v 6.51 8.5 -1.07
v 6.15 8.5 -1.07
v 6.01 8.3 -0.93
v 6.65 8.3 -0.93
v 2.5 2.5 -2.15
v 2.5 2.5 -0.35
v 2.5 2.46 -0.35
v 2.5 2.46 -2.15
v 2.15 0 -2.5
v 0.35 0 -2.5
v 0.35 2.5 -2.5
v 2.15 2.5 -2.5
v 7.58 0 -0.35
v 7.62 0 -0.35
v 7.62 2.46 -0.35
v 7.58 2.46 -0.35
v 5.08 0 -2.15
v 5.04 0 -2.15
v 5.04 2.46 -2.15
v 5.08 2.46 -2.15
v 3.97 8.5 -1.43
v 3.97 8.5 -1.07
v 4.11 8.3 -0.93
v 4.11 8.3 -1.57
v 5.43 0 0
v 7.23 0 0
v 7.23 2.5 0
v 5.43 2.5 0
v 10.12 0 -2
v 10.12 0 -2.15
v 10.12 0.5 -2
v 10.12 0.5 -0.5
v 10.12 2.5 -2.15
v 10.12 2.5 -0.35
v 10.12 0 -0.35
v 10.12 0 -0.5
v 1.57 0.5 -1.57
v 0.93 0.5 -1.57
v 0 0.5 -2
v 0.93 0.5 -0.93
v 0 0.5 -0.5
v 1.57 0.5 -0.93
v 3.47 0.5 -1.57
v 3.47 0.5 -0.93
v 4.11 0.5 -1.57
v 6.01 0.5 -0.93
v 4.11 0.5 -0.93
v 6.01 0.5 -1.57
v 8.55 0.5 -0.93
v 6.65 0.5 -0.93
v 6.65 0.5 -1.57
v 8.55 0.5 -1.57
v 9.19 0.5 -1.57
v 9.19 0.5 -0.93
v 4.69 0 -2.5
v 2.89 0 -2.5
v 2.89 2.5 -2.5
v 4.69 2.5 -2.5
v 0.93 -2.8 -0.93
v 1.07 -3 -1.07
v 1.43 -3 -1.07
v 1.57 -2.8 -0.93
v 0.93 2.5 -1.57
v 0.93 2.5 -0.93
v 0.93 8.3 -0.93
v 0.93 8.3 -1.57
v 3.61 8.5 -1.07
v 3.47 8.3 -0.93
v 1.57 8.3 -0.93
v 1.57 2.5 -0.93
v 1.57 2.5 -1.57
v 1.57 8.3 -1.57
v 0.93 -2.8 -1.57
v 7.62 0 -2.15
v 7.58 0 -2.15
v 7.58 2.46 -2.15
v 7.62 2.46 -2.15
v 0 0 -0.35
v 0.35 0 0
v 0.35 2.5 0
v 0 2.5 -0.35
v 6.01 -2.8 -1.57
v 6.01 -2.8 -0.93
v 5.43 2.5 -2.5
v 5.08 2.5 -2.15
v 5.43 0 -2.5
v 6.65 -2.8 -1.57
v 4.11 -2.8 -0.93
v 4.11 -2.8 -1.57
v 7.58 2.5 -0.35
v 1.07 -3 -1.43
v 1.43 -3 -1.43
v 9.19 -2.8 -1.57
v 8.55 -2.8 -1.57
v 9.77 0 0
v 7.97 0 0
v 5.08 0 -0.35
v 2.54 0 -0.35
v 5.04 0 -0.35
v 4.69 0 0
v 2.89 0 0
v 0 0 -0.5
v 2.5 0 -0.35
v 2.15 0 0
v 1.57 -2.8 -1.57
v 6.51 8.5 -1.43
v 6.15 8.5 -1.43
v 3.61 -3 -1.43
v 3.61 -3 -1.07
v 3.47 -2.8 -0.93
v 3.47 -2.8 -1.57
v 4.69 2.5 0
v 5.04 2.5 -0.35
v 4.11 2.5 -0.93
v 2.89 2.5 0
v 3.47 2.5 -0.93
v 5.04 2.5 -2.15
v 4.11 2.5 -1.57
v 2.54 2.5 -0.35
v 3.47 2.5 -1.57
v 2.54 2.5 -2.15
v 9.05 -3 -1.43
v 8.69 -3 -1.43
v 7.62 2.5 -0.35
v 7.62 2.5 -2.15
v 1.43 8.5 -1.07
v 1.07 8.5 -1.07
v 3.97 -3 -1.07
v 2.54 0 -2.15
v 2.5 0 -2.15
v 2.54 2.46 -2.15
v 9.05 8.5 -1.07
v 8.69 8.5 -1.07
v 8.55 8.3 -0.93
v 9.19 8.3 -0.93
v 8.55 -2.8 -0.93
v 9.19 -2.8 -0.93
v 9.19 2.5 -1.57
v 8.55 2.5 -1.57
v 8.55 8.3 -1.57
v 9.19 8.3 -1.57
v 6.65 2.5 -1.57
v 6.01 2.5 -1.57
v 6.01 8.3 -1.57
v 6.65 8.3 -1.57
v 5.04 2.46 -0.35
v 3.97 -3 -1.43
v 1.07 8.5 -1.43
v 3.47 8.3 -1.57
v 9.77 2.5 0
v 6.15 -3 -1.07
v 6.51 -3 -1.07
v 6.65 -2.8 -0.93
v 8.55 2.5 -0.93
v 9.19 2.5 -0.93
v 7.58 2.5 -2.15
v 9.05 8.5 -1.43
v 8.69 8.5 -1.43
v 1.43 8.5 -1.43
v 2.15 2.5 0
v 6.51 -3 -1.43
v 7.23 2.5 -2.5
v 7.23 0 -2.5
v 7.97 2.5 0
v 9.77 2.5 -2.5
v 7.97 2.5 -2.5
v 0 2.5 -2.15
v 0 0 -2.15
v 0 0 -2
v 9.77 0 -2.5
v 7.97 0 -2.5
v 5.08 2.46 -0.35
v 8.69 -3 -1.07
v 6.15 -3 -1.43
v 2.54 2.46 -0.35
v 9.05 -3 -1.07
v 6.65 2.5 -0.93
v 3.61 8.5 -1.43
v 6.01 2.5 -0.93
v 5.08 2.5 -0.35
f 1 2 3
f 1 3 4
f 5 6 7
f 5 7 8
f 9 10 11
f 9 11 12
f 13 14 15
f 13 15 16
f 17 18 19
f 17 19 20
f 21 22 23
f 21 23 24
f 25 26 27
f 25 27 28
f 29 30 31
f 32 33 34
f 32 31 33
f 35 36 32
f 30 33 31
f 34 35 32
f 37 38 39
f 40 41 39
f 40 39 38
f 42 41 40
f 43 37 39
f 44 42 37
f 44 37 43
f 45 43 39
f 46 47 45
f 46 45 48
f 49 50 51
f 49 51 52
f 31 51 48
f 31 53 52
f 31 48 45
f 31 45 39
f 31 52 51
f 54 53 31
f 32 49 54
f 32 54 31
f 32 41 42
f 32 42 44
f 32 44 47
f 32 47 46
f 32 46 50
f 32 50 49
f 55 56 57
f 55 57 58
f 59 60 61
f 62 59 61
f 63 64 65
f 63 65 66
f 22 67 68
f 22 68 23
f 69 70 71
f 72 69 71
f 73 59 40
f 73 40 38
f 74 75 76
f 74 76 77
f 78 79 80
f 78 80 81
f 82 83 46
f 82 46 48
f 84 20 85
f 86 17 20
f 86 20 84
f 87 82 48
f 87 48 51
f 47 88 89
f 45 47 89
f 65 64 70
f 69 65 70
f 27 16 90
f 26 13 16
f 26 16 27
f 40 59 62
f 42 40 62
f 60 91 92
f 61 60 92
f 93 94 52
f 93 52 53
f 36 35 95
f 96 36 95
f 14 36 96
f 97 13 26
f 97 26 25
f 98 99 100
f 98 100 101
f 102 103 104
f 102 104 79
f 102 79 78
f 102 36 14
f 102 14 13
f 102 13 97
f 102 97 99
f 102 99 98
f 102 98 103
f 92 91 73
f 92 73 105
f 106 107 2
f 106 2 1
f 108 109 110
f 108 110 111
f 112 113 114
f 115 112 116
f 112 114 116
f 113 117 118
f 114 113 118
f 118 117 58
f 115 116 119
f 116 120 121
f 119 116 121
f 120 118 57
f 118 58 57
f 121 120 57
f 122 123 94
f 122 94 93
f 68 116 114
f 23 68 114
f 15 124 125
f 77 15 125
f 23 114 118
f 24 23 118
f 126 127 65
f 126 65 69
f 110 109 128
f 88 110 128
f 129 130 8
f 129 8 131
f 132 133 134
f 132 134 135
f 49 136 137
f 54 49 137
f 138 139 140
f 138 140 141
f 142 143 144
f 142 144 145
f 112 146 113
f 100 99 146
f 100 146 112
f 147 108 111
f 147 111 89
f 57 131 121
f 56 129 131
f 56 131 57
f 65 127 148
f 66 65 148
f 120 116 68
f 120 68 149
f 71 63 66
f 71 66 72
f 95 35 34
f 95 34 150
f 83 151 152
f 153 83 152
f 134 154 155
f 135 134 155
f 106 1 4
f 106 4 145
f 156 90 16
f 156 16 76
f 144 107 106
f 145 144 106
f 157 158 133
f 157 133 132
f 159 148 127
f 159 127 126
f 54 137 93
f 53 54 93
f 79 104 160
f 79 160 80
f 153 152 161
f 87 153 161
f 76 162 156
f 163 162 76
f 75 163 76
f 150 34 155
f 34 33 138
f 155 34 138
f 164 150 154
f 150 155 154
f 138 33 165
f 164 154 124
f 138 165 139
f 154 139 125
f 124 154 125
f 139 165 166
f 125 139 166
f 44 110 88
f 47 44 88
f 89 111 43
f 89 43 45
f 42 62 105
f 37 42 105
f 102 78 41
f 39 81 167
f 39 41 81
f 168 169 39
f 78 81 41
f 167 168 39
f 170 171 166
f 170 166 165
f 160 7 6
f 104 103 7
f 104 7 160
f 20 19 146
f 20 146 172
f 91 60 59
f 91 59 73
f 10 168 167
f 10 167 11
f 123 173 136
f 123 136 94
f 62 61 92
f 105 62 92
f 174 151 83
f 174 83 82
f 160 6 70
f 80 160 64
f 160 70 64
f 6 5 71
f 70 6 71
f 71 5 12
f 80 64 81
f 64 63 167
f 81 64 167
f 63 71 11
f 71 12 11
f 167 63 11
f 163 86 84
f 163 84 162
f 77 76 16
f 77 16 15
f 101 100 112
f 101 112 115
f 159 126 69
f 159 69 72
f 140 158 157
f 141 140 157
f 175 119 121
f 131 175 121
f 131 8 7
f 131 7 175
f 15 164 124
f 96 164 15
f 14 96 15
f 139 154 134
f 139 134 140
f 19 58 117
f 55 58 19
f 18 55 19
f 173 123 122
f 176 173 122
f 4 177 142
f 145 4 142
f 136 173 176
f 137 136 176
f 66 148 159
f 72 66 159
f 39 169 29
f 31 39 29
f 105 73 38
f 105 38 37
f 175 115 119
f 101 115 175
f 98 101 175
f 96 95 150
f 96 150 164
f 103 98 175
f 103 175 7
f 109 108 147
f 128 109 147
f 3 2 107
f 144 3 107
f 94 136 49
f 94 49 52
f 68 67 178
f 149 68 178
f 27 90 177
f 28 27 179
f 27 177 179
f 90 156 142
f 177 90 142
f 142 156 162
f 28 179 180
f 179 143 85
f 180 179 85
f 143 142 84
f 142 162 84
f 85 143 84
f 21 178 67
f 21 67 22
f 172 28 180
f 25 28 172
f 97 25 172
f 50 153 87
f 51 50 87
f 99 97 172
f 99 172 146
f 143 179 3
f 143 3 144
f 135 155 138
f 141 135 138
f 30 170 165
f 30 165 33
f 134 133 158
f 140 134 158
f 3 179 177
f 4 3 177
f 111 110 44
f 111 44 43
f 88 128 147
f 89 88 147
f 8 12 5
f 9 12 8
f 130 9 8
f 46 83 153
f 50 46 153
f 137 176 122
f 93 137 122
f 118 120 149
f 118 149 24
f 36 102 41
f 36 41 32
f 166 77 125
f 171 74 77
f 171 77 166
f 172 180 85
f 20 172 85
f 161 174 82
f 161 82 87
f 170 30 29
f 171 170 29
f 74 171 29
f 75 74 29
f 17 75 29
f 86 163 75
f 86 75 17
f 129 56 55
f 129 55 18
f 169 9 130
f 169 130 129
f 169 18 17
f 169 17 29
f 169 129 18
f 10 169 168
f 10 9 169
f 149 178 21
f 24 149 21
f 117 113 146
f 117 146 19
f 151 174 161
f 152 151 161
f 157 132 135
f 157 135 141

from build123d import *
from OCP.BRepFilletAPI import BRepFilletAPI_MakeChamfer

# Parameters (mm, degrees)
BOSS_EXTRUDE1_DEPTH         = 2.5
SKETCH2_W                   = 10.12
SKETCH2_H                   = 1.5
CUT_EXTRUDE1_DEPTH          = 0.5
SKETCH4_W                   = 0.04
SKETCH4_H                   = 1.8
CUT_EXTRUDE2_DEPTH          = 0.04
BOSS_EXTRUDE2_START         = -5.5
SKETCH3_W                   = 0.64
SKETCH3_H                   = 0.64
BOSS_EXTRUDE2_DEPTH         = 11.5
CHAMFER1_SIZE               = 0.2
CHAMFER1_SIZE2              = 0.140041508
LPATTERN1_COUNT             = 4
LPATTERN1_PITCH             = 2.54
CHAMFER1_OF_LPATTERN1_SIZE  = 0.2
CHAMFER1_OF_LPATTERN1_SIZE2 = 0.140041508


with BuildPart() as part:
    # Sketch1 → Boss-Extrude1 (new body)
    with BuildSketch(Plane(origin=(0, 0, 0), x_dir=(1, 0, 0), z_dir=(0, 1, 0))):
        Polygon((0, 2.15), (0.35, 2.5), (2.15, 2.5), (2.5, 2.15), (2.54, 2.15), (2.89, 2.5), (4.69, 2.5), (5.04, 2.15), (5.08, 2.15), (5.43, 2.5), (7.23, 2.5), (7.58, 2.15), (7.62, 2.15), (7.97, 2.5), (9.77, 2.5), (10.12, 2.15), (10.12, 0.35), (9.77, 0), (7.97, 0), (7.62, 0.35), (7.58, 0.35), (7.23, 0), (5.43, 0), (5.08, 0.35), (5.04, 0.35), (4.69, 0), (2.89, 0), (2.54, 0.35), (2.5, 0.35), (2.15, 0), (0.35, 0), (0, 0.35), align=None)
    extrude(amount=BOSS_EXTRUDE1_DEPTH)

    # Sketch2 → Cut-Extrude1 (cut)
    with BuildSketch(Plane.XZ):
        with Locations((5.06, -1.25)):
            Rectangle(SKETCH2_W, SKETCH2_H)
    extrude(amount=-CUT_EXTRUDE1_DEPTH, mode=Mode.SUBTRACT)

    # Sketch4 → Cut-Extrude2 (cut)
    with BuildSketch(Plane(origin=(0, 2.5, 0), x_dir=(1, 0, 0), z_dir=(0, 1, 0))):
        with Locations((5.06, 1.25)):
            Rectangle(SKETCH4_W, SKETCH4_H)
        with Locations((2.52, 1.25)):
            Rectangle(SKETCH4_W, SKETCH4_H)
        with Locations((7.6, 1.25)):
            Rectangle(SKETCH4_W, SKETCH4_H)
        with Locations((10.14, 1.25)):
            Rectangle(SKETCH4_W, SKETCH4_H)
        with Locations((12.68, 1.25)):
            Rectangle(SKETCH4_W, SKETCH4_H)
        with Locations((15.22, 1.25)):
            Rectangle(SKETCH4_W, SKETCH4_H)
        with Locations((17.76, 1.25)):
            Rectangle(SKETCH4_W, SKETCH4_H)
    extrude(amount=-CUT_EXTRUDE2_DEPTH, mode=Mode.SUBTRACT)

    # Sketch3 → Boss-Extrude2 (add)
    with BuildSketch(Plane(origin=(0, 2.5, 0), x_dir=(1, 0, 0), z_dir=(0, 1, 0)).offset(BOSS_EXTRUDE2_START)):
        with Locations((1.25, 1.25)):
            Rectangle(SKETCH3_W, SKETCH3_H)
    boss_extrude2 = extrude(amount=BOSS_EXTRUDE2_DEPTH)

    # Chamfer1: one chamfer whose edges measure the first distance from different faces: ONE call of the kernel's chamfer builder (chamfer() names one face for all edges)
    chamfer1_edges_1 = [part.edges().sort_by_distance(p)[0] for p in [
        (1.57, -3, -1.25),
    ]]
    chamfer1_side_1 = [part.faces().sort_by_distance(p)[0] for p in [
        (1.57, -1.25, -1.25),
    ]]
    chamfer1_edges_2 = [part.edges().sort_by_distance(p)[0] for p in [
        (1.25, -3, -0.93),
    ]]
    chamfer1_side_2 = [part.faces().sort_by_distance(p)[0] for p in [
        (1.25, -1.25, -0.93),
    ]]
    chamfer1_edges_3 = [part.edges().sort_by_distance(p)[0] for p in [
        (0.93, -3, -1.25),
    ]]
    chamfer1_side_3 = [part.faces().sort_by_distance(p)[0] for p in [
        (0.93, -1.25, -1.25),
    ]]
    chamfer1_edges_4 = [part.edges().sort_by_distance(p)[0] for p in [
        (1.25, -3, -1.57),
    ]]
    chamfer1_side_4 = [part.faces().sort_by_distance(p)[0] for p in [
        (1.25, -1.25, -1.57),
    ]]
    chamfer1_edges_5 = [part.edges().sort_by_distance(p)[0] for p in [
        (1.57, 8.5, -1.25),
    ]]
    chamfer1_side_5 = [part.faces().sort_by_distance(p)[0] for p in [
        (1.57, 5.5, -1.25),
    ]]
    chamfer1_edges_6 = [part.edges().sort_by_distance(p)[0] for p in [
        (1.25, 8.5, -1.57),
    ]]
    chamfer1_side_6 = [part.faces().sort_by_distance(p)[0] for p in [
        (1.25, 5.5, -1.57),
    ]]
    chamfer1_edges_7 = [part.edges().sort_by_distance(p)[0] for p in [
        (0.93, 8.5, -1.25),
    ]]
    chamfer1_side_7 = [part.faces().sort_by_distance(p)[0] for p in [
        (0.93, 5.5, -1.25),
    ]]
    chamfer1_edges_8 = [part.edges().sort_by_distance(p)[0] for p in [
        (1.25, 8.5, -0.93),
    ]]
    chamfer1_side_8 = [part.faces().sort_by_distance(p)[0] for p in [
        (1.25, 5.5, -0.93),
    ]]
    chamfer1 = BRepFilletAPI_MakeChamfer(part.part.solid().wrapped)
    for e in chamfer1_edges_1:
        chamfer1.Add(CHAMFER1_SIZE, CHAMFER1_SIZE2, e.wrapped, chamfer1_side_1[0].wrapped)  # the first distance lies on this face
    for e in chamfer1_edges_2:
        chamfer1.Add(CHAMFER1_SIZE, CHAMFER1_SIZE2, e.wrapped, chamfer1_side_2[0].wrapped)  # the first distance lies on this face
    for e in chamfer1_edges_3:
        chamfer1.Add(CHAMFER1_SIZE, CHAMFER1_SIZE2, e.wrapped, chamfer1_side_3[0].wrapped)  # the first distance lies on this face
    for e in chamfer1_edges_4:
        chamfer1.Add(CHAMFER1_SIZE, CHAMFER1_SIZE2, e.wrapped, chamfer1_side_4[0].wrapped)  # the first distance lies on this face
    for e in chamfer1_edges_5:
        chamfer1.Add(CHAMFER1_SIZE, CHAMFER1_SIZE2, e.wrapped, chamfer1_side_5[0].wrapped)  # the first distance lies on this face
    for e in chamfer1_edges_6:
        chamfer1.Add(CHAMFER1_SIZE, CHAMFER1_SIZE2, e.wrapped, chamfer1_side_6[0].wrapped)  # the first distance lies on this face
    for e in chamfer1_edges_7:
        chamfer1.Add(CHAMFER1_SIZE, CHAMFER1_SIZE2, e.wrapped, chamfer1_side_7[0].wrapped)  # the first distance lies on this face
    for e in chamfer1_edges_8:
        chamfer1.Add(CHAMFER1_SIZE, CHAMFER1_SIZE2, e.wrapped, chamfer1_side_8[0].wrapped)  # the first distance lies on this face
    add(Compound.cast(chamfer1.Shape()), mode=Mode.REPLACE)

    # LPattern1: Boss-Extrude2 ×4
    with Locations(*[(i * LPATTERN1_PITCH, 0, 0) for i in range(1, LPATTERN1_COUNT)]):
        add(boss_extrude2)

    # Chamfer1 of LPattern1: one chamfer whose edges measure the first distance from different faces: ONE call of the kernel's chamfer builder (chamfer() names one face for all edges)
    chamfer1_of_lpattern1_edges_1 = [part.edges().sort_by_distance(p)[0] for p in [
        (4.11, -3, -1.25),
    ]]
    chamfer1_of_lpattern1_side_1 = [part.faces().sort_by_distance(p)[0] for p in [
        (4.11, -1.25, -1.25),
    ]]
    chamfer1_of_lpattern1_edges_2 = [part.edges().sort_by_distance(p)[0] for p in [
        (3.79, -3, -0.93),
    ]]
    chamfer1_of_lpattern1_side_2 = [part.faces().sort_by_distance(p)[0] for p in [
        (3.79, -1.25, -0.93),
    ]]
    chamfer1_of_lpattern1_edges_3 = [part.edges().sort_by_distance(p)[0] for p in [
        (3.47, -3, -1.25),
    ]]
    chamfer1_of_lpattern1_side_3 = [part.faces().sort_by_distance(p)[0] for p in [
        (3.47, -1.25, -1.25),
    ]]
    chamfer1_of_lpattern1_edges_4 = [part.edges().sort_by_distance(p)[0] for p in [
        (3.79, -3, -1.57),
    ]]
    chamfer1_of_lpattern1_side_4 = [part.faces().sort_by_distance(p)[0] for p in [
        (3.79, -1.25, -1.57),
    ]]
    chamfer1_of_lpattern1_edges_5 = [part.edges().sort_by_distance(p)[0] for p in [
        (4.11, 8.5, -1.25),
    ]]
    chamfer1_of_lpattern1_side_5 = [part.faces().sort_by_distance(p)[0] for p in [
        (4.11, 5.5, -1.25),
    ]]
    chamfer1_of_lpattern1_edges_6 = [part.edges().sort_by_distance(p)[0] for p in [
        (3.79, 8.5, -1.57),
    ]]
    chamfer1_of_lpattern1_side_6 = [part.faces().sort_by_distance(p)[0] for p in [
        (3.79, 5.5, -1.57),
    ]]
    chamfer1_of_lpattern1_edges_7 = [part.edges().sort_by_distance(p)[0] for p in [
        (3.47, 8.5, -1.25),
    ]]
    chamfer1_of_lpattern1_side_7 = [part.faces().sort_by_distance(p)[0] for p in [
        (3.47, 5.5, -1.25),
    ]]
    chamfer1_of_lpattern1_edges_8 = [part.edges().sort_by_distance(p)[0] for p in [
        (3.79, 8.5, -0.93),
    ]]
    chamfer1_of_lpattern1_side_8 = [part.faces().sort_by_distance(p)[0] for p in [
        (3.79, 5.5, -0.93),
    ]]
    chamfer1_of_lpattern1_edges_9 = [part.edges().sort_by_distance(p)[0] for p in [
        (6.65, -3, -1.25),
    ]]
    chamfer1_of_lpattern1_side_9 = [part.faces().sort_by_distance(p)[0] for p in [
        (6.65, -1.25, -1.25),
    ]]
    chamfer1_of_lpattern1_edges_10 = [part.edges().sort_by_distance(p)[0] for p in [
        (6.33, -3, -0.93),
    ]]
    chamfer1_of_lpattern1_side_10 = [part.faces().sort_by_distance(p)[0] for p in [
        (6.33, -1.25, -0.93),
    ]]
    chamfer1_of_lpattern1_edges_11 = [part.edges().sort_by_distance(p)[0] for p in [
        (6.01, -3, -1.25),
    ]]
    chamfer1_of_lpattern1_side_11 = [part.faces().sort_by_distance(p)[0] for p in [
        (6.01, -1.25, -1.25),
    ]]
    chamfer1_of_lpattern1_edges_12 = [part.edges().sort_by_distance(p)[0] for p in [
        (6.33, -3, -1.57),
    ]]
    chamfer1_of_lpattern1_side_12 = [part.faces().sort_by_distance(p)[0] for p in [
        (6.33, -1.25, -1.57),
    ]]
    chamfer1_of_lpattern1_edges_13 = [part.edges().sort_by_distance(p)[0] for p in [
        (6.65, 8.5, -1.25),
    ]]
    chamfer1_of_lpattern1_side_13 = [part.faces().sort_by_distance(p)[0] for p in [
        (6.65, 5.5, -1.25),
    ]]
    chamfer1_of_lpattern1_edges_14 = [part.edges().sort_by_distance(p)[0] for p in [
        (6.33, 8.5, -1.57),
    ]]
    chamfer1_of_lpattern1_side_14 = [part.faces().sort_by_distance(p)[0] for p in [
        (6.33, 5.5, -1.57),
    ]]
    chamfer1_of_lpattern1_edges_15 = [part.edges().sort_by_distance(p)[0] for p in [
        (6.01, 8.5, -1.25),
    ]]
    chamfer1_of_lpattern1_side_15 = [part.faces().sort_by_distance(p)[0] for p in [
        (6.01, 5.5, -1.25),
    ]]
    chamfer1_of_lpattern1_edges_16 = [part.edges().sort_by_distance(p)[0] for p in [
        (6.33, 8.5, -0.93),
    ]]
    chamfer1_of_lpattern1_side_16 = [part.faces().sort_by_distance(p)[0] for p in [
        (6.33, 5.5, -0.93),
    ]]
    chamfer1_of_lpattern1_edges_17 = [part.edges().sort_by_distance(p)[0] for p in [
        (9.19, -3, -1.25),
    ]]
    chamfer1_of_lpattern1_side_17 = [part.faces().sort_by_distance(p)[0] for p in [
        (9.19, -1.25, -1.25),
    ]]
    chamfer1_of_lpattern1_edges_18 = [part.edges().sort_by_distance(p)[0] for p in [
        (8.87, -3, -0.93),
    ]]
    chamfer1_of_lpattern1_side_18 = [part.faces().sort_by_distance(p)[0] for p in [
        (8.87, -1.25, -0.93),
    ]]
    chamfer1_of_lpattern1_edges_19 = [part.edges().sort_by_distance(p)[0] for p in [
        (8.55, -3, -1.25),
    ]]
    chamfer1_of_lpattern1_side_19 = [part.faces().sort_by_distance(p)[0] for p in [
        (8.55, -1.25, -1.25),
    ]]
    chamfer1_of_lpattern1_edges_20 = [part.edges().sort_by_distance(p)[0] for p in [
        (8.87, -3, -1.57),
    ]]
    chamfer1_of_lpattern1_side_20 = [part.faces().sort_by_distance(p)[0] for p in [
        (8.87, -1.25, -1.57),
    ]]
    chamfer1_of_lpattern1_edges_21 = [part.edges().sort_by_distance(p)[0] for p in [
        (9.19, 8.5, -1.25),
    ]]
    chamfer1_of_lpattern1_side_21 = [part.faces().sort_by_distance(p)[0] for p in [
        (9.19, 5.5, -1.25),
    ]]
    chamfer1_of_lpattern1_edges_22 = [part.edges().sort_by_distance(p)[0] for p in [
        (8.87, 8.5, -1.57),
    ]]
    chamfer1_of_lpattern1_side_22 = [part.faces().sort_by_distance(p)[0] for p in [
        (8.87, 5.5, -1.57),
    ]]
    chamfer1_of_lpattern1_edges_23 = [part.edges().sort_by_distance(p)[0] for p in [
        (8.55, 8.5, -1.25),
    ]]
    chamfer1_of_lpattern1_side_23 = [part.faces().sort_by_distance(p)[0] for p in [
        (8.55, 5.5, -1.25),
    ]]
    chamfer1_of_lpattern1_edges_24 = [part.edges().sort_by_distance(p)[0] for p in [
        (8.87, 8.5, -0.93),
    ]]
    chamfer1_of_lpattern1_side_24 = [part.faces().sort_by_distance(p)[0] for p in [
        (8.87, 5.5, -0.93),
    ]]
    chamfer1_of_lpattern1 = BRepFilletAPI_MakeChamfer(part.part.solid().wrapped)
    for e in chamfer1_of_lpattern1_edges_1:
        chamfer1_of_lpattern1.Add(CHAMFER1_OF_LPATTERN1_SIZE, CHAMFER1_OF_LPATTERN1_SIZE2, e.wrapped, chamfer1_of_lpattern1_side_1[0].wrapped)  # the first distance lies on this face
    for e in chamfer1_of_lpattern1_edges_2:
        chamfer1_of_lpattern1.Add(CHAMFER1_OF_LPATTERN1_SIZE, CHAMFER1_OF_LPATTERN1_SIZE2, e.wrapped, chamfer1_of_lpattern1_side_2[0].wrapped)  # the first distance lies on this face
    for e in chamfer1_of_lpattern1_edges_3:
        chamfer1_of_lpattern1.Add(CHAMFER1_OF_LPATTERN1_SIZE, CHAMFER1_OF_LPATTERN1_SIZE2, e.wrapped, chamfer1_of_lpattern1_side_3[0].wrapped)  # the first distance lies on this face
    for e in chamfer1_of_lpattern1_edges_4:
        chamfer1_of_lpattern1.Add(CHAMFER1_OF_LPATTERN1_SIZE, CHAMFER1_OF_LPATTERN1_SIZE2, e.wrapped, chamfer1_of_lpattern1_side_4[0].wrapped)  # the first distance lies on this face
    for e in chamfer1_of_lpattern1_edges_5:
        chamfer1_of_lpattern1.Add(CHAMFER1_OF_LPATTERN1_SIZE, CHAMFER1_OF_LPATTERN1_SIZE2, e.wrapped, chamfer1_of_lpattern1_side_5[0].wrapped)  # the first distance lies on this face
    for e in chamfer1_of_lpattern1_edges_6:
        chamfer1_of_lpattern1.Add(CHAMFER1_OF_LPATTERN1_SIZE, CHAMFER1_OF_LPATTERN1_SIZE2, e.wrapped, chamfer1_of_lpattern1_side_6[0].wrapped)  # the first distance lies on this face
    for e in chamfer1_of_lpattern1_edges_7:
        chamfer1_of_lpattern1.Add(CHAMFER1_OF_LPATTERN1_SIZE, CHAMFER1_OF_LPATTERN1_SIZE2, e.wrapped, chamfer1_of_lpattern1_side_7[0].wrapped)  # the first distance lies on this face
    for e in chamfer1_of_lpattern1_edges_8:
        chamfer1_of_lpattern1.Add(CHAMFER1_OF_LPATTERN1_SIZE, CHAMFER1_OF_LPATTERN1_SIZE2, e.wrapped, chamfer1_of_lpattern1_side_8[0].wrapped)  # the first distance lies on this face
    for e in chamfer1_of_lpattern1_edges_9:
        chamfer1_of_lpattern1.Add(CHAMFER1_OF_LPATTERN1_SIZE, CHAMFER1_OF_LPATTERN1_SIZE2, e.wrapped, chamfer1_of_lpattern1_side_9[0].wrapped)  # the first distance lies on this face
    for e in chamfer1_of_lpattern1_edges_10:
        chamfer1_of_lpattern1.Add(CHAMFER1_OF_LPATTERN1_SIZE, CHAMFER1_OF_LPATTERN1_SIZE2, e.wrapped, chamfer1_of_lpattern1_side_10[0].wrapped)  # the first distance lies on this face
    for e in chamfer1_of_lpattern1_edges_11:
        chamfer1_of_lpattern1.Add(CHAMFER1_OF_LPATTERN1_SIZE, CHAMFER1_OF_LPATTERN1_SIZE2, e.wrapped, chamfer1_of_lpattern1_side_11[0].wrapped)  # the first distance lies on this face
    for e in chamfer1_of_lpattern1_edges_12:
        chamfer1_of_lpattern1.Add(CHAMFER1_OF_LPATTERN1_SIZE, CHAMFER1_OF_LPATTERN1_SIZE2, e.wrapped, chamfer1_of_lpattern1_side_12[0].wrapped)  # the first distance lies on this face
    for e in chamfer1_of_lpattern1_edges_13:
        chamfer1_of_lpattern1.Add(CHAMFER1_OF_LPATTERN1_SIZE, CHAMFER1_OF_LPATTERN1_SIZE2, e.wrapped, chamfer1_of_lpattern1_side_13[0].wrapped)  # the first distance lies on this face
    for e in chamfer1_of_lpattern1_edges_14:
        chamfer1_of_lpattern1.Add(CHAMFER1_OF_LPATTERN1_SIZE, CHAMFER1_OF_LPATTERN1_SIZE2, e.wrapped, chamfer1_of_lpattern1_side_14[0].wrapped)  # the first distance lies on this face
    for e in chamfer1_of_lpattern1_edges_15:
        chamfer1_of_lpattern1.Add(CHAMFER1_OF_LPATTERN1_SIZE, CHAMFER1_OF_LPATTERN1_SIZE2, e.wrapped, chamfer1_of_lpattern1_side_15[0].wrapped)  # the first distance lies on this face
    for e in chamfer1_of_lpattern1_edges_16:
        chamfer1_of_lpattern1.Add(CHAMFER1_OF_LPATTERN1_SIZE, CHAMFER1_OF_LPATTERN1_SIZE2, e.wrapped, chamfer1_of_lpattern1_side_16[0].wrapped)  # the first distance lies on this face
    for e in chamfer1_of_lpattern1_edges_17:
        chamfer1_of_lpattern1.Add(CHAMFER1_OF_LPATTERN1_SIZE, CHAMFER1_OF_LPATTERN1_SIZE2, e.wrapped, chamfer1_of_lpattern1_side_17[0].wrapped)  # the first distance lies on this face
    for e in chamfer1_of_lpattern1_edges_18:
        chamfer1_of_lpattern1.Add(CHAMFER1_OF_LPATTERN1_SIZE, CHAMFER1_OF_LPATTERN1_SIZE2, e.wrapped, chamfer1_of_lpattern1_side_18[0].wrapped)  # the first distance lies on this face
    for e in chamfer1_of_lpattern1_edges_19:
        chamfer1_of_lpattern1.Add(CHAMFER1_OF_LPATTERN1_SIZE, CHAMFER1_OF_LPATTERN1_SIZE2, e.wrapped, chamfer1_of_lpattern1_side_19[0].wrapped)  # the first distance lies on this face
    for e in chamfer1_of_lpattern1_edges_20:
        chamfer1_of_lpattern1.Add(CHAMFER1_OF_LPATTERN1_SIZE, CHAMFER1_OF_LPATTERN1_SIZE2, e.wrapped, chamfer1_of_lpattern1_side_20[0].wrapped)  # the first distance lies on this face
    for e in chamfer1_of_lpattern1_edges_21:
        chamfer1_of_lpattern1.Add(CHAMFER1_OF_LPATTERN1_SIZE, CHAMFER1_OF_LPATTERN1_SIZE2, e.wrapped, chamfer1_of_lpattern1_side_21[0].wrapped)  # the first distance lies on this face
    for e in chamfer1_of_lpattern1_edges_22:
        chamfer1_of_lpattern1.Add(CHAMFER1_OF_LPATTERN1_SIZE, CHAMFER1_OF_LPATTERN1_SIZE2, e.wrapped, chamfer1_of_lpattern1_side_22[0].wrapped)  # the first distance lies on this face
    for e in chamfer1_of_lpattern1_edges_23:
        chamfer1_of_lpattern1.Add(CHAMFER1_OF_LPATTERN1_SIZE, CHAMFER1_OF_LPATTERN1_SIZE2, e.wrapped, chamfer1_of_lpattern1_side_23[0].wrapped)  # the first distance lies on this face
    for e in chamfer1_of_lpattern1_edges_24:
        chamfer1_of_lpattern1.Add(CHAMFER1_OF_LPATTERN1_SIZE, CHAMFER1_OF_LPATTERN1_SIZE2, e.wrapped, chamfer1_of_lpattern1_side_24[0].wrapped)  # the first distance lies on this face
    add(Compound.cast(chamfer1_of_lpattern1.Shape()), mode=Mode.REPLACE)


solid = part.part
